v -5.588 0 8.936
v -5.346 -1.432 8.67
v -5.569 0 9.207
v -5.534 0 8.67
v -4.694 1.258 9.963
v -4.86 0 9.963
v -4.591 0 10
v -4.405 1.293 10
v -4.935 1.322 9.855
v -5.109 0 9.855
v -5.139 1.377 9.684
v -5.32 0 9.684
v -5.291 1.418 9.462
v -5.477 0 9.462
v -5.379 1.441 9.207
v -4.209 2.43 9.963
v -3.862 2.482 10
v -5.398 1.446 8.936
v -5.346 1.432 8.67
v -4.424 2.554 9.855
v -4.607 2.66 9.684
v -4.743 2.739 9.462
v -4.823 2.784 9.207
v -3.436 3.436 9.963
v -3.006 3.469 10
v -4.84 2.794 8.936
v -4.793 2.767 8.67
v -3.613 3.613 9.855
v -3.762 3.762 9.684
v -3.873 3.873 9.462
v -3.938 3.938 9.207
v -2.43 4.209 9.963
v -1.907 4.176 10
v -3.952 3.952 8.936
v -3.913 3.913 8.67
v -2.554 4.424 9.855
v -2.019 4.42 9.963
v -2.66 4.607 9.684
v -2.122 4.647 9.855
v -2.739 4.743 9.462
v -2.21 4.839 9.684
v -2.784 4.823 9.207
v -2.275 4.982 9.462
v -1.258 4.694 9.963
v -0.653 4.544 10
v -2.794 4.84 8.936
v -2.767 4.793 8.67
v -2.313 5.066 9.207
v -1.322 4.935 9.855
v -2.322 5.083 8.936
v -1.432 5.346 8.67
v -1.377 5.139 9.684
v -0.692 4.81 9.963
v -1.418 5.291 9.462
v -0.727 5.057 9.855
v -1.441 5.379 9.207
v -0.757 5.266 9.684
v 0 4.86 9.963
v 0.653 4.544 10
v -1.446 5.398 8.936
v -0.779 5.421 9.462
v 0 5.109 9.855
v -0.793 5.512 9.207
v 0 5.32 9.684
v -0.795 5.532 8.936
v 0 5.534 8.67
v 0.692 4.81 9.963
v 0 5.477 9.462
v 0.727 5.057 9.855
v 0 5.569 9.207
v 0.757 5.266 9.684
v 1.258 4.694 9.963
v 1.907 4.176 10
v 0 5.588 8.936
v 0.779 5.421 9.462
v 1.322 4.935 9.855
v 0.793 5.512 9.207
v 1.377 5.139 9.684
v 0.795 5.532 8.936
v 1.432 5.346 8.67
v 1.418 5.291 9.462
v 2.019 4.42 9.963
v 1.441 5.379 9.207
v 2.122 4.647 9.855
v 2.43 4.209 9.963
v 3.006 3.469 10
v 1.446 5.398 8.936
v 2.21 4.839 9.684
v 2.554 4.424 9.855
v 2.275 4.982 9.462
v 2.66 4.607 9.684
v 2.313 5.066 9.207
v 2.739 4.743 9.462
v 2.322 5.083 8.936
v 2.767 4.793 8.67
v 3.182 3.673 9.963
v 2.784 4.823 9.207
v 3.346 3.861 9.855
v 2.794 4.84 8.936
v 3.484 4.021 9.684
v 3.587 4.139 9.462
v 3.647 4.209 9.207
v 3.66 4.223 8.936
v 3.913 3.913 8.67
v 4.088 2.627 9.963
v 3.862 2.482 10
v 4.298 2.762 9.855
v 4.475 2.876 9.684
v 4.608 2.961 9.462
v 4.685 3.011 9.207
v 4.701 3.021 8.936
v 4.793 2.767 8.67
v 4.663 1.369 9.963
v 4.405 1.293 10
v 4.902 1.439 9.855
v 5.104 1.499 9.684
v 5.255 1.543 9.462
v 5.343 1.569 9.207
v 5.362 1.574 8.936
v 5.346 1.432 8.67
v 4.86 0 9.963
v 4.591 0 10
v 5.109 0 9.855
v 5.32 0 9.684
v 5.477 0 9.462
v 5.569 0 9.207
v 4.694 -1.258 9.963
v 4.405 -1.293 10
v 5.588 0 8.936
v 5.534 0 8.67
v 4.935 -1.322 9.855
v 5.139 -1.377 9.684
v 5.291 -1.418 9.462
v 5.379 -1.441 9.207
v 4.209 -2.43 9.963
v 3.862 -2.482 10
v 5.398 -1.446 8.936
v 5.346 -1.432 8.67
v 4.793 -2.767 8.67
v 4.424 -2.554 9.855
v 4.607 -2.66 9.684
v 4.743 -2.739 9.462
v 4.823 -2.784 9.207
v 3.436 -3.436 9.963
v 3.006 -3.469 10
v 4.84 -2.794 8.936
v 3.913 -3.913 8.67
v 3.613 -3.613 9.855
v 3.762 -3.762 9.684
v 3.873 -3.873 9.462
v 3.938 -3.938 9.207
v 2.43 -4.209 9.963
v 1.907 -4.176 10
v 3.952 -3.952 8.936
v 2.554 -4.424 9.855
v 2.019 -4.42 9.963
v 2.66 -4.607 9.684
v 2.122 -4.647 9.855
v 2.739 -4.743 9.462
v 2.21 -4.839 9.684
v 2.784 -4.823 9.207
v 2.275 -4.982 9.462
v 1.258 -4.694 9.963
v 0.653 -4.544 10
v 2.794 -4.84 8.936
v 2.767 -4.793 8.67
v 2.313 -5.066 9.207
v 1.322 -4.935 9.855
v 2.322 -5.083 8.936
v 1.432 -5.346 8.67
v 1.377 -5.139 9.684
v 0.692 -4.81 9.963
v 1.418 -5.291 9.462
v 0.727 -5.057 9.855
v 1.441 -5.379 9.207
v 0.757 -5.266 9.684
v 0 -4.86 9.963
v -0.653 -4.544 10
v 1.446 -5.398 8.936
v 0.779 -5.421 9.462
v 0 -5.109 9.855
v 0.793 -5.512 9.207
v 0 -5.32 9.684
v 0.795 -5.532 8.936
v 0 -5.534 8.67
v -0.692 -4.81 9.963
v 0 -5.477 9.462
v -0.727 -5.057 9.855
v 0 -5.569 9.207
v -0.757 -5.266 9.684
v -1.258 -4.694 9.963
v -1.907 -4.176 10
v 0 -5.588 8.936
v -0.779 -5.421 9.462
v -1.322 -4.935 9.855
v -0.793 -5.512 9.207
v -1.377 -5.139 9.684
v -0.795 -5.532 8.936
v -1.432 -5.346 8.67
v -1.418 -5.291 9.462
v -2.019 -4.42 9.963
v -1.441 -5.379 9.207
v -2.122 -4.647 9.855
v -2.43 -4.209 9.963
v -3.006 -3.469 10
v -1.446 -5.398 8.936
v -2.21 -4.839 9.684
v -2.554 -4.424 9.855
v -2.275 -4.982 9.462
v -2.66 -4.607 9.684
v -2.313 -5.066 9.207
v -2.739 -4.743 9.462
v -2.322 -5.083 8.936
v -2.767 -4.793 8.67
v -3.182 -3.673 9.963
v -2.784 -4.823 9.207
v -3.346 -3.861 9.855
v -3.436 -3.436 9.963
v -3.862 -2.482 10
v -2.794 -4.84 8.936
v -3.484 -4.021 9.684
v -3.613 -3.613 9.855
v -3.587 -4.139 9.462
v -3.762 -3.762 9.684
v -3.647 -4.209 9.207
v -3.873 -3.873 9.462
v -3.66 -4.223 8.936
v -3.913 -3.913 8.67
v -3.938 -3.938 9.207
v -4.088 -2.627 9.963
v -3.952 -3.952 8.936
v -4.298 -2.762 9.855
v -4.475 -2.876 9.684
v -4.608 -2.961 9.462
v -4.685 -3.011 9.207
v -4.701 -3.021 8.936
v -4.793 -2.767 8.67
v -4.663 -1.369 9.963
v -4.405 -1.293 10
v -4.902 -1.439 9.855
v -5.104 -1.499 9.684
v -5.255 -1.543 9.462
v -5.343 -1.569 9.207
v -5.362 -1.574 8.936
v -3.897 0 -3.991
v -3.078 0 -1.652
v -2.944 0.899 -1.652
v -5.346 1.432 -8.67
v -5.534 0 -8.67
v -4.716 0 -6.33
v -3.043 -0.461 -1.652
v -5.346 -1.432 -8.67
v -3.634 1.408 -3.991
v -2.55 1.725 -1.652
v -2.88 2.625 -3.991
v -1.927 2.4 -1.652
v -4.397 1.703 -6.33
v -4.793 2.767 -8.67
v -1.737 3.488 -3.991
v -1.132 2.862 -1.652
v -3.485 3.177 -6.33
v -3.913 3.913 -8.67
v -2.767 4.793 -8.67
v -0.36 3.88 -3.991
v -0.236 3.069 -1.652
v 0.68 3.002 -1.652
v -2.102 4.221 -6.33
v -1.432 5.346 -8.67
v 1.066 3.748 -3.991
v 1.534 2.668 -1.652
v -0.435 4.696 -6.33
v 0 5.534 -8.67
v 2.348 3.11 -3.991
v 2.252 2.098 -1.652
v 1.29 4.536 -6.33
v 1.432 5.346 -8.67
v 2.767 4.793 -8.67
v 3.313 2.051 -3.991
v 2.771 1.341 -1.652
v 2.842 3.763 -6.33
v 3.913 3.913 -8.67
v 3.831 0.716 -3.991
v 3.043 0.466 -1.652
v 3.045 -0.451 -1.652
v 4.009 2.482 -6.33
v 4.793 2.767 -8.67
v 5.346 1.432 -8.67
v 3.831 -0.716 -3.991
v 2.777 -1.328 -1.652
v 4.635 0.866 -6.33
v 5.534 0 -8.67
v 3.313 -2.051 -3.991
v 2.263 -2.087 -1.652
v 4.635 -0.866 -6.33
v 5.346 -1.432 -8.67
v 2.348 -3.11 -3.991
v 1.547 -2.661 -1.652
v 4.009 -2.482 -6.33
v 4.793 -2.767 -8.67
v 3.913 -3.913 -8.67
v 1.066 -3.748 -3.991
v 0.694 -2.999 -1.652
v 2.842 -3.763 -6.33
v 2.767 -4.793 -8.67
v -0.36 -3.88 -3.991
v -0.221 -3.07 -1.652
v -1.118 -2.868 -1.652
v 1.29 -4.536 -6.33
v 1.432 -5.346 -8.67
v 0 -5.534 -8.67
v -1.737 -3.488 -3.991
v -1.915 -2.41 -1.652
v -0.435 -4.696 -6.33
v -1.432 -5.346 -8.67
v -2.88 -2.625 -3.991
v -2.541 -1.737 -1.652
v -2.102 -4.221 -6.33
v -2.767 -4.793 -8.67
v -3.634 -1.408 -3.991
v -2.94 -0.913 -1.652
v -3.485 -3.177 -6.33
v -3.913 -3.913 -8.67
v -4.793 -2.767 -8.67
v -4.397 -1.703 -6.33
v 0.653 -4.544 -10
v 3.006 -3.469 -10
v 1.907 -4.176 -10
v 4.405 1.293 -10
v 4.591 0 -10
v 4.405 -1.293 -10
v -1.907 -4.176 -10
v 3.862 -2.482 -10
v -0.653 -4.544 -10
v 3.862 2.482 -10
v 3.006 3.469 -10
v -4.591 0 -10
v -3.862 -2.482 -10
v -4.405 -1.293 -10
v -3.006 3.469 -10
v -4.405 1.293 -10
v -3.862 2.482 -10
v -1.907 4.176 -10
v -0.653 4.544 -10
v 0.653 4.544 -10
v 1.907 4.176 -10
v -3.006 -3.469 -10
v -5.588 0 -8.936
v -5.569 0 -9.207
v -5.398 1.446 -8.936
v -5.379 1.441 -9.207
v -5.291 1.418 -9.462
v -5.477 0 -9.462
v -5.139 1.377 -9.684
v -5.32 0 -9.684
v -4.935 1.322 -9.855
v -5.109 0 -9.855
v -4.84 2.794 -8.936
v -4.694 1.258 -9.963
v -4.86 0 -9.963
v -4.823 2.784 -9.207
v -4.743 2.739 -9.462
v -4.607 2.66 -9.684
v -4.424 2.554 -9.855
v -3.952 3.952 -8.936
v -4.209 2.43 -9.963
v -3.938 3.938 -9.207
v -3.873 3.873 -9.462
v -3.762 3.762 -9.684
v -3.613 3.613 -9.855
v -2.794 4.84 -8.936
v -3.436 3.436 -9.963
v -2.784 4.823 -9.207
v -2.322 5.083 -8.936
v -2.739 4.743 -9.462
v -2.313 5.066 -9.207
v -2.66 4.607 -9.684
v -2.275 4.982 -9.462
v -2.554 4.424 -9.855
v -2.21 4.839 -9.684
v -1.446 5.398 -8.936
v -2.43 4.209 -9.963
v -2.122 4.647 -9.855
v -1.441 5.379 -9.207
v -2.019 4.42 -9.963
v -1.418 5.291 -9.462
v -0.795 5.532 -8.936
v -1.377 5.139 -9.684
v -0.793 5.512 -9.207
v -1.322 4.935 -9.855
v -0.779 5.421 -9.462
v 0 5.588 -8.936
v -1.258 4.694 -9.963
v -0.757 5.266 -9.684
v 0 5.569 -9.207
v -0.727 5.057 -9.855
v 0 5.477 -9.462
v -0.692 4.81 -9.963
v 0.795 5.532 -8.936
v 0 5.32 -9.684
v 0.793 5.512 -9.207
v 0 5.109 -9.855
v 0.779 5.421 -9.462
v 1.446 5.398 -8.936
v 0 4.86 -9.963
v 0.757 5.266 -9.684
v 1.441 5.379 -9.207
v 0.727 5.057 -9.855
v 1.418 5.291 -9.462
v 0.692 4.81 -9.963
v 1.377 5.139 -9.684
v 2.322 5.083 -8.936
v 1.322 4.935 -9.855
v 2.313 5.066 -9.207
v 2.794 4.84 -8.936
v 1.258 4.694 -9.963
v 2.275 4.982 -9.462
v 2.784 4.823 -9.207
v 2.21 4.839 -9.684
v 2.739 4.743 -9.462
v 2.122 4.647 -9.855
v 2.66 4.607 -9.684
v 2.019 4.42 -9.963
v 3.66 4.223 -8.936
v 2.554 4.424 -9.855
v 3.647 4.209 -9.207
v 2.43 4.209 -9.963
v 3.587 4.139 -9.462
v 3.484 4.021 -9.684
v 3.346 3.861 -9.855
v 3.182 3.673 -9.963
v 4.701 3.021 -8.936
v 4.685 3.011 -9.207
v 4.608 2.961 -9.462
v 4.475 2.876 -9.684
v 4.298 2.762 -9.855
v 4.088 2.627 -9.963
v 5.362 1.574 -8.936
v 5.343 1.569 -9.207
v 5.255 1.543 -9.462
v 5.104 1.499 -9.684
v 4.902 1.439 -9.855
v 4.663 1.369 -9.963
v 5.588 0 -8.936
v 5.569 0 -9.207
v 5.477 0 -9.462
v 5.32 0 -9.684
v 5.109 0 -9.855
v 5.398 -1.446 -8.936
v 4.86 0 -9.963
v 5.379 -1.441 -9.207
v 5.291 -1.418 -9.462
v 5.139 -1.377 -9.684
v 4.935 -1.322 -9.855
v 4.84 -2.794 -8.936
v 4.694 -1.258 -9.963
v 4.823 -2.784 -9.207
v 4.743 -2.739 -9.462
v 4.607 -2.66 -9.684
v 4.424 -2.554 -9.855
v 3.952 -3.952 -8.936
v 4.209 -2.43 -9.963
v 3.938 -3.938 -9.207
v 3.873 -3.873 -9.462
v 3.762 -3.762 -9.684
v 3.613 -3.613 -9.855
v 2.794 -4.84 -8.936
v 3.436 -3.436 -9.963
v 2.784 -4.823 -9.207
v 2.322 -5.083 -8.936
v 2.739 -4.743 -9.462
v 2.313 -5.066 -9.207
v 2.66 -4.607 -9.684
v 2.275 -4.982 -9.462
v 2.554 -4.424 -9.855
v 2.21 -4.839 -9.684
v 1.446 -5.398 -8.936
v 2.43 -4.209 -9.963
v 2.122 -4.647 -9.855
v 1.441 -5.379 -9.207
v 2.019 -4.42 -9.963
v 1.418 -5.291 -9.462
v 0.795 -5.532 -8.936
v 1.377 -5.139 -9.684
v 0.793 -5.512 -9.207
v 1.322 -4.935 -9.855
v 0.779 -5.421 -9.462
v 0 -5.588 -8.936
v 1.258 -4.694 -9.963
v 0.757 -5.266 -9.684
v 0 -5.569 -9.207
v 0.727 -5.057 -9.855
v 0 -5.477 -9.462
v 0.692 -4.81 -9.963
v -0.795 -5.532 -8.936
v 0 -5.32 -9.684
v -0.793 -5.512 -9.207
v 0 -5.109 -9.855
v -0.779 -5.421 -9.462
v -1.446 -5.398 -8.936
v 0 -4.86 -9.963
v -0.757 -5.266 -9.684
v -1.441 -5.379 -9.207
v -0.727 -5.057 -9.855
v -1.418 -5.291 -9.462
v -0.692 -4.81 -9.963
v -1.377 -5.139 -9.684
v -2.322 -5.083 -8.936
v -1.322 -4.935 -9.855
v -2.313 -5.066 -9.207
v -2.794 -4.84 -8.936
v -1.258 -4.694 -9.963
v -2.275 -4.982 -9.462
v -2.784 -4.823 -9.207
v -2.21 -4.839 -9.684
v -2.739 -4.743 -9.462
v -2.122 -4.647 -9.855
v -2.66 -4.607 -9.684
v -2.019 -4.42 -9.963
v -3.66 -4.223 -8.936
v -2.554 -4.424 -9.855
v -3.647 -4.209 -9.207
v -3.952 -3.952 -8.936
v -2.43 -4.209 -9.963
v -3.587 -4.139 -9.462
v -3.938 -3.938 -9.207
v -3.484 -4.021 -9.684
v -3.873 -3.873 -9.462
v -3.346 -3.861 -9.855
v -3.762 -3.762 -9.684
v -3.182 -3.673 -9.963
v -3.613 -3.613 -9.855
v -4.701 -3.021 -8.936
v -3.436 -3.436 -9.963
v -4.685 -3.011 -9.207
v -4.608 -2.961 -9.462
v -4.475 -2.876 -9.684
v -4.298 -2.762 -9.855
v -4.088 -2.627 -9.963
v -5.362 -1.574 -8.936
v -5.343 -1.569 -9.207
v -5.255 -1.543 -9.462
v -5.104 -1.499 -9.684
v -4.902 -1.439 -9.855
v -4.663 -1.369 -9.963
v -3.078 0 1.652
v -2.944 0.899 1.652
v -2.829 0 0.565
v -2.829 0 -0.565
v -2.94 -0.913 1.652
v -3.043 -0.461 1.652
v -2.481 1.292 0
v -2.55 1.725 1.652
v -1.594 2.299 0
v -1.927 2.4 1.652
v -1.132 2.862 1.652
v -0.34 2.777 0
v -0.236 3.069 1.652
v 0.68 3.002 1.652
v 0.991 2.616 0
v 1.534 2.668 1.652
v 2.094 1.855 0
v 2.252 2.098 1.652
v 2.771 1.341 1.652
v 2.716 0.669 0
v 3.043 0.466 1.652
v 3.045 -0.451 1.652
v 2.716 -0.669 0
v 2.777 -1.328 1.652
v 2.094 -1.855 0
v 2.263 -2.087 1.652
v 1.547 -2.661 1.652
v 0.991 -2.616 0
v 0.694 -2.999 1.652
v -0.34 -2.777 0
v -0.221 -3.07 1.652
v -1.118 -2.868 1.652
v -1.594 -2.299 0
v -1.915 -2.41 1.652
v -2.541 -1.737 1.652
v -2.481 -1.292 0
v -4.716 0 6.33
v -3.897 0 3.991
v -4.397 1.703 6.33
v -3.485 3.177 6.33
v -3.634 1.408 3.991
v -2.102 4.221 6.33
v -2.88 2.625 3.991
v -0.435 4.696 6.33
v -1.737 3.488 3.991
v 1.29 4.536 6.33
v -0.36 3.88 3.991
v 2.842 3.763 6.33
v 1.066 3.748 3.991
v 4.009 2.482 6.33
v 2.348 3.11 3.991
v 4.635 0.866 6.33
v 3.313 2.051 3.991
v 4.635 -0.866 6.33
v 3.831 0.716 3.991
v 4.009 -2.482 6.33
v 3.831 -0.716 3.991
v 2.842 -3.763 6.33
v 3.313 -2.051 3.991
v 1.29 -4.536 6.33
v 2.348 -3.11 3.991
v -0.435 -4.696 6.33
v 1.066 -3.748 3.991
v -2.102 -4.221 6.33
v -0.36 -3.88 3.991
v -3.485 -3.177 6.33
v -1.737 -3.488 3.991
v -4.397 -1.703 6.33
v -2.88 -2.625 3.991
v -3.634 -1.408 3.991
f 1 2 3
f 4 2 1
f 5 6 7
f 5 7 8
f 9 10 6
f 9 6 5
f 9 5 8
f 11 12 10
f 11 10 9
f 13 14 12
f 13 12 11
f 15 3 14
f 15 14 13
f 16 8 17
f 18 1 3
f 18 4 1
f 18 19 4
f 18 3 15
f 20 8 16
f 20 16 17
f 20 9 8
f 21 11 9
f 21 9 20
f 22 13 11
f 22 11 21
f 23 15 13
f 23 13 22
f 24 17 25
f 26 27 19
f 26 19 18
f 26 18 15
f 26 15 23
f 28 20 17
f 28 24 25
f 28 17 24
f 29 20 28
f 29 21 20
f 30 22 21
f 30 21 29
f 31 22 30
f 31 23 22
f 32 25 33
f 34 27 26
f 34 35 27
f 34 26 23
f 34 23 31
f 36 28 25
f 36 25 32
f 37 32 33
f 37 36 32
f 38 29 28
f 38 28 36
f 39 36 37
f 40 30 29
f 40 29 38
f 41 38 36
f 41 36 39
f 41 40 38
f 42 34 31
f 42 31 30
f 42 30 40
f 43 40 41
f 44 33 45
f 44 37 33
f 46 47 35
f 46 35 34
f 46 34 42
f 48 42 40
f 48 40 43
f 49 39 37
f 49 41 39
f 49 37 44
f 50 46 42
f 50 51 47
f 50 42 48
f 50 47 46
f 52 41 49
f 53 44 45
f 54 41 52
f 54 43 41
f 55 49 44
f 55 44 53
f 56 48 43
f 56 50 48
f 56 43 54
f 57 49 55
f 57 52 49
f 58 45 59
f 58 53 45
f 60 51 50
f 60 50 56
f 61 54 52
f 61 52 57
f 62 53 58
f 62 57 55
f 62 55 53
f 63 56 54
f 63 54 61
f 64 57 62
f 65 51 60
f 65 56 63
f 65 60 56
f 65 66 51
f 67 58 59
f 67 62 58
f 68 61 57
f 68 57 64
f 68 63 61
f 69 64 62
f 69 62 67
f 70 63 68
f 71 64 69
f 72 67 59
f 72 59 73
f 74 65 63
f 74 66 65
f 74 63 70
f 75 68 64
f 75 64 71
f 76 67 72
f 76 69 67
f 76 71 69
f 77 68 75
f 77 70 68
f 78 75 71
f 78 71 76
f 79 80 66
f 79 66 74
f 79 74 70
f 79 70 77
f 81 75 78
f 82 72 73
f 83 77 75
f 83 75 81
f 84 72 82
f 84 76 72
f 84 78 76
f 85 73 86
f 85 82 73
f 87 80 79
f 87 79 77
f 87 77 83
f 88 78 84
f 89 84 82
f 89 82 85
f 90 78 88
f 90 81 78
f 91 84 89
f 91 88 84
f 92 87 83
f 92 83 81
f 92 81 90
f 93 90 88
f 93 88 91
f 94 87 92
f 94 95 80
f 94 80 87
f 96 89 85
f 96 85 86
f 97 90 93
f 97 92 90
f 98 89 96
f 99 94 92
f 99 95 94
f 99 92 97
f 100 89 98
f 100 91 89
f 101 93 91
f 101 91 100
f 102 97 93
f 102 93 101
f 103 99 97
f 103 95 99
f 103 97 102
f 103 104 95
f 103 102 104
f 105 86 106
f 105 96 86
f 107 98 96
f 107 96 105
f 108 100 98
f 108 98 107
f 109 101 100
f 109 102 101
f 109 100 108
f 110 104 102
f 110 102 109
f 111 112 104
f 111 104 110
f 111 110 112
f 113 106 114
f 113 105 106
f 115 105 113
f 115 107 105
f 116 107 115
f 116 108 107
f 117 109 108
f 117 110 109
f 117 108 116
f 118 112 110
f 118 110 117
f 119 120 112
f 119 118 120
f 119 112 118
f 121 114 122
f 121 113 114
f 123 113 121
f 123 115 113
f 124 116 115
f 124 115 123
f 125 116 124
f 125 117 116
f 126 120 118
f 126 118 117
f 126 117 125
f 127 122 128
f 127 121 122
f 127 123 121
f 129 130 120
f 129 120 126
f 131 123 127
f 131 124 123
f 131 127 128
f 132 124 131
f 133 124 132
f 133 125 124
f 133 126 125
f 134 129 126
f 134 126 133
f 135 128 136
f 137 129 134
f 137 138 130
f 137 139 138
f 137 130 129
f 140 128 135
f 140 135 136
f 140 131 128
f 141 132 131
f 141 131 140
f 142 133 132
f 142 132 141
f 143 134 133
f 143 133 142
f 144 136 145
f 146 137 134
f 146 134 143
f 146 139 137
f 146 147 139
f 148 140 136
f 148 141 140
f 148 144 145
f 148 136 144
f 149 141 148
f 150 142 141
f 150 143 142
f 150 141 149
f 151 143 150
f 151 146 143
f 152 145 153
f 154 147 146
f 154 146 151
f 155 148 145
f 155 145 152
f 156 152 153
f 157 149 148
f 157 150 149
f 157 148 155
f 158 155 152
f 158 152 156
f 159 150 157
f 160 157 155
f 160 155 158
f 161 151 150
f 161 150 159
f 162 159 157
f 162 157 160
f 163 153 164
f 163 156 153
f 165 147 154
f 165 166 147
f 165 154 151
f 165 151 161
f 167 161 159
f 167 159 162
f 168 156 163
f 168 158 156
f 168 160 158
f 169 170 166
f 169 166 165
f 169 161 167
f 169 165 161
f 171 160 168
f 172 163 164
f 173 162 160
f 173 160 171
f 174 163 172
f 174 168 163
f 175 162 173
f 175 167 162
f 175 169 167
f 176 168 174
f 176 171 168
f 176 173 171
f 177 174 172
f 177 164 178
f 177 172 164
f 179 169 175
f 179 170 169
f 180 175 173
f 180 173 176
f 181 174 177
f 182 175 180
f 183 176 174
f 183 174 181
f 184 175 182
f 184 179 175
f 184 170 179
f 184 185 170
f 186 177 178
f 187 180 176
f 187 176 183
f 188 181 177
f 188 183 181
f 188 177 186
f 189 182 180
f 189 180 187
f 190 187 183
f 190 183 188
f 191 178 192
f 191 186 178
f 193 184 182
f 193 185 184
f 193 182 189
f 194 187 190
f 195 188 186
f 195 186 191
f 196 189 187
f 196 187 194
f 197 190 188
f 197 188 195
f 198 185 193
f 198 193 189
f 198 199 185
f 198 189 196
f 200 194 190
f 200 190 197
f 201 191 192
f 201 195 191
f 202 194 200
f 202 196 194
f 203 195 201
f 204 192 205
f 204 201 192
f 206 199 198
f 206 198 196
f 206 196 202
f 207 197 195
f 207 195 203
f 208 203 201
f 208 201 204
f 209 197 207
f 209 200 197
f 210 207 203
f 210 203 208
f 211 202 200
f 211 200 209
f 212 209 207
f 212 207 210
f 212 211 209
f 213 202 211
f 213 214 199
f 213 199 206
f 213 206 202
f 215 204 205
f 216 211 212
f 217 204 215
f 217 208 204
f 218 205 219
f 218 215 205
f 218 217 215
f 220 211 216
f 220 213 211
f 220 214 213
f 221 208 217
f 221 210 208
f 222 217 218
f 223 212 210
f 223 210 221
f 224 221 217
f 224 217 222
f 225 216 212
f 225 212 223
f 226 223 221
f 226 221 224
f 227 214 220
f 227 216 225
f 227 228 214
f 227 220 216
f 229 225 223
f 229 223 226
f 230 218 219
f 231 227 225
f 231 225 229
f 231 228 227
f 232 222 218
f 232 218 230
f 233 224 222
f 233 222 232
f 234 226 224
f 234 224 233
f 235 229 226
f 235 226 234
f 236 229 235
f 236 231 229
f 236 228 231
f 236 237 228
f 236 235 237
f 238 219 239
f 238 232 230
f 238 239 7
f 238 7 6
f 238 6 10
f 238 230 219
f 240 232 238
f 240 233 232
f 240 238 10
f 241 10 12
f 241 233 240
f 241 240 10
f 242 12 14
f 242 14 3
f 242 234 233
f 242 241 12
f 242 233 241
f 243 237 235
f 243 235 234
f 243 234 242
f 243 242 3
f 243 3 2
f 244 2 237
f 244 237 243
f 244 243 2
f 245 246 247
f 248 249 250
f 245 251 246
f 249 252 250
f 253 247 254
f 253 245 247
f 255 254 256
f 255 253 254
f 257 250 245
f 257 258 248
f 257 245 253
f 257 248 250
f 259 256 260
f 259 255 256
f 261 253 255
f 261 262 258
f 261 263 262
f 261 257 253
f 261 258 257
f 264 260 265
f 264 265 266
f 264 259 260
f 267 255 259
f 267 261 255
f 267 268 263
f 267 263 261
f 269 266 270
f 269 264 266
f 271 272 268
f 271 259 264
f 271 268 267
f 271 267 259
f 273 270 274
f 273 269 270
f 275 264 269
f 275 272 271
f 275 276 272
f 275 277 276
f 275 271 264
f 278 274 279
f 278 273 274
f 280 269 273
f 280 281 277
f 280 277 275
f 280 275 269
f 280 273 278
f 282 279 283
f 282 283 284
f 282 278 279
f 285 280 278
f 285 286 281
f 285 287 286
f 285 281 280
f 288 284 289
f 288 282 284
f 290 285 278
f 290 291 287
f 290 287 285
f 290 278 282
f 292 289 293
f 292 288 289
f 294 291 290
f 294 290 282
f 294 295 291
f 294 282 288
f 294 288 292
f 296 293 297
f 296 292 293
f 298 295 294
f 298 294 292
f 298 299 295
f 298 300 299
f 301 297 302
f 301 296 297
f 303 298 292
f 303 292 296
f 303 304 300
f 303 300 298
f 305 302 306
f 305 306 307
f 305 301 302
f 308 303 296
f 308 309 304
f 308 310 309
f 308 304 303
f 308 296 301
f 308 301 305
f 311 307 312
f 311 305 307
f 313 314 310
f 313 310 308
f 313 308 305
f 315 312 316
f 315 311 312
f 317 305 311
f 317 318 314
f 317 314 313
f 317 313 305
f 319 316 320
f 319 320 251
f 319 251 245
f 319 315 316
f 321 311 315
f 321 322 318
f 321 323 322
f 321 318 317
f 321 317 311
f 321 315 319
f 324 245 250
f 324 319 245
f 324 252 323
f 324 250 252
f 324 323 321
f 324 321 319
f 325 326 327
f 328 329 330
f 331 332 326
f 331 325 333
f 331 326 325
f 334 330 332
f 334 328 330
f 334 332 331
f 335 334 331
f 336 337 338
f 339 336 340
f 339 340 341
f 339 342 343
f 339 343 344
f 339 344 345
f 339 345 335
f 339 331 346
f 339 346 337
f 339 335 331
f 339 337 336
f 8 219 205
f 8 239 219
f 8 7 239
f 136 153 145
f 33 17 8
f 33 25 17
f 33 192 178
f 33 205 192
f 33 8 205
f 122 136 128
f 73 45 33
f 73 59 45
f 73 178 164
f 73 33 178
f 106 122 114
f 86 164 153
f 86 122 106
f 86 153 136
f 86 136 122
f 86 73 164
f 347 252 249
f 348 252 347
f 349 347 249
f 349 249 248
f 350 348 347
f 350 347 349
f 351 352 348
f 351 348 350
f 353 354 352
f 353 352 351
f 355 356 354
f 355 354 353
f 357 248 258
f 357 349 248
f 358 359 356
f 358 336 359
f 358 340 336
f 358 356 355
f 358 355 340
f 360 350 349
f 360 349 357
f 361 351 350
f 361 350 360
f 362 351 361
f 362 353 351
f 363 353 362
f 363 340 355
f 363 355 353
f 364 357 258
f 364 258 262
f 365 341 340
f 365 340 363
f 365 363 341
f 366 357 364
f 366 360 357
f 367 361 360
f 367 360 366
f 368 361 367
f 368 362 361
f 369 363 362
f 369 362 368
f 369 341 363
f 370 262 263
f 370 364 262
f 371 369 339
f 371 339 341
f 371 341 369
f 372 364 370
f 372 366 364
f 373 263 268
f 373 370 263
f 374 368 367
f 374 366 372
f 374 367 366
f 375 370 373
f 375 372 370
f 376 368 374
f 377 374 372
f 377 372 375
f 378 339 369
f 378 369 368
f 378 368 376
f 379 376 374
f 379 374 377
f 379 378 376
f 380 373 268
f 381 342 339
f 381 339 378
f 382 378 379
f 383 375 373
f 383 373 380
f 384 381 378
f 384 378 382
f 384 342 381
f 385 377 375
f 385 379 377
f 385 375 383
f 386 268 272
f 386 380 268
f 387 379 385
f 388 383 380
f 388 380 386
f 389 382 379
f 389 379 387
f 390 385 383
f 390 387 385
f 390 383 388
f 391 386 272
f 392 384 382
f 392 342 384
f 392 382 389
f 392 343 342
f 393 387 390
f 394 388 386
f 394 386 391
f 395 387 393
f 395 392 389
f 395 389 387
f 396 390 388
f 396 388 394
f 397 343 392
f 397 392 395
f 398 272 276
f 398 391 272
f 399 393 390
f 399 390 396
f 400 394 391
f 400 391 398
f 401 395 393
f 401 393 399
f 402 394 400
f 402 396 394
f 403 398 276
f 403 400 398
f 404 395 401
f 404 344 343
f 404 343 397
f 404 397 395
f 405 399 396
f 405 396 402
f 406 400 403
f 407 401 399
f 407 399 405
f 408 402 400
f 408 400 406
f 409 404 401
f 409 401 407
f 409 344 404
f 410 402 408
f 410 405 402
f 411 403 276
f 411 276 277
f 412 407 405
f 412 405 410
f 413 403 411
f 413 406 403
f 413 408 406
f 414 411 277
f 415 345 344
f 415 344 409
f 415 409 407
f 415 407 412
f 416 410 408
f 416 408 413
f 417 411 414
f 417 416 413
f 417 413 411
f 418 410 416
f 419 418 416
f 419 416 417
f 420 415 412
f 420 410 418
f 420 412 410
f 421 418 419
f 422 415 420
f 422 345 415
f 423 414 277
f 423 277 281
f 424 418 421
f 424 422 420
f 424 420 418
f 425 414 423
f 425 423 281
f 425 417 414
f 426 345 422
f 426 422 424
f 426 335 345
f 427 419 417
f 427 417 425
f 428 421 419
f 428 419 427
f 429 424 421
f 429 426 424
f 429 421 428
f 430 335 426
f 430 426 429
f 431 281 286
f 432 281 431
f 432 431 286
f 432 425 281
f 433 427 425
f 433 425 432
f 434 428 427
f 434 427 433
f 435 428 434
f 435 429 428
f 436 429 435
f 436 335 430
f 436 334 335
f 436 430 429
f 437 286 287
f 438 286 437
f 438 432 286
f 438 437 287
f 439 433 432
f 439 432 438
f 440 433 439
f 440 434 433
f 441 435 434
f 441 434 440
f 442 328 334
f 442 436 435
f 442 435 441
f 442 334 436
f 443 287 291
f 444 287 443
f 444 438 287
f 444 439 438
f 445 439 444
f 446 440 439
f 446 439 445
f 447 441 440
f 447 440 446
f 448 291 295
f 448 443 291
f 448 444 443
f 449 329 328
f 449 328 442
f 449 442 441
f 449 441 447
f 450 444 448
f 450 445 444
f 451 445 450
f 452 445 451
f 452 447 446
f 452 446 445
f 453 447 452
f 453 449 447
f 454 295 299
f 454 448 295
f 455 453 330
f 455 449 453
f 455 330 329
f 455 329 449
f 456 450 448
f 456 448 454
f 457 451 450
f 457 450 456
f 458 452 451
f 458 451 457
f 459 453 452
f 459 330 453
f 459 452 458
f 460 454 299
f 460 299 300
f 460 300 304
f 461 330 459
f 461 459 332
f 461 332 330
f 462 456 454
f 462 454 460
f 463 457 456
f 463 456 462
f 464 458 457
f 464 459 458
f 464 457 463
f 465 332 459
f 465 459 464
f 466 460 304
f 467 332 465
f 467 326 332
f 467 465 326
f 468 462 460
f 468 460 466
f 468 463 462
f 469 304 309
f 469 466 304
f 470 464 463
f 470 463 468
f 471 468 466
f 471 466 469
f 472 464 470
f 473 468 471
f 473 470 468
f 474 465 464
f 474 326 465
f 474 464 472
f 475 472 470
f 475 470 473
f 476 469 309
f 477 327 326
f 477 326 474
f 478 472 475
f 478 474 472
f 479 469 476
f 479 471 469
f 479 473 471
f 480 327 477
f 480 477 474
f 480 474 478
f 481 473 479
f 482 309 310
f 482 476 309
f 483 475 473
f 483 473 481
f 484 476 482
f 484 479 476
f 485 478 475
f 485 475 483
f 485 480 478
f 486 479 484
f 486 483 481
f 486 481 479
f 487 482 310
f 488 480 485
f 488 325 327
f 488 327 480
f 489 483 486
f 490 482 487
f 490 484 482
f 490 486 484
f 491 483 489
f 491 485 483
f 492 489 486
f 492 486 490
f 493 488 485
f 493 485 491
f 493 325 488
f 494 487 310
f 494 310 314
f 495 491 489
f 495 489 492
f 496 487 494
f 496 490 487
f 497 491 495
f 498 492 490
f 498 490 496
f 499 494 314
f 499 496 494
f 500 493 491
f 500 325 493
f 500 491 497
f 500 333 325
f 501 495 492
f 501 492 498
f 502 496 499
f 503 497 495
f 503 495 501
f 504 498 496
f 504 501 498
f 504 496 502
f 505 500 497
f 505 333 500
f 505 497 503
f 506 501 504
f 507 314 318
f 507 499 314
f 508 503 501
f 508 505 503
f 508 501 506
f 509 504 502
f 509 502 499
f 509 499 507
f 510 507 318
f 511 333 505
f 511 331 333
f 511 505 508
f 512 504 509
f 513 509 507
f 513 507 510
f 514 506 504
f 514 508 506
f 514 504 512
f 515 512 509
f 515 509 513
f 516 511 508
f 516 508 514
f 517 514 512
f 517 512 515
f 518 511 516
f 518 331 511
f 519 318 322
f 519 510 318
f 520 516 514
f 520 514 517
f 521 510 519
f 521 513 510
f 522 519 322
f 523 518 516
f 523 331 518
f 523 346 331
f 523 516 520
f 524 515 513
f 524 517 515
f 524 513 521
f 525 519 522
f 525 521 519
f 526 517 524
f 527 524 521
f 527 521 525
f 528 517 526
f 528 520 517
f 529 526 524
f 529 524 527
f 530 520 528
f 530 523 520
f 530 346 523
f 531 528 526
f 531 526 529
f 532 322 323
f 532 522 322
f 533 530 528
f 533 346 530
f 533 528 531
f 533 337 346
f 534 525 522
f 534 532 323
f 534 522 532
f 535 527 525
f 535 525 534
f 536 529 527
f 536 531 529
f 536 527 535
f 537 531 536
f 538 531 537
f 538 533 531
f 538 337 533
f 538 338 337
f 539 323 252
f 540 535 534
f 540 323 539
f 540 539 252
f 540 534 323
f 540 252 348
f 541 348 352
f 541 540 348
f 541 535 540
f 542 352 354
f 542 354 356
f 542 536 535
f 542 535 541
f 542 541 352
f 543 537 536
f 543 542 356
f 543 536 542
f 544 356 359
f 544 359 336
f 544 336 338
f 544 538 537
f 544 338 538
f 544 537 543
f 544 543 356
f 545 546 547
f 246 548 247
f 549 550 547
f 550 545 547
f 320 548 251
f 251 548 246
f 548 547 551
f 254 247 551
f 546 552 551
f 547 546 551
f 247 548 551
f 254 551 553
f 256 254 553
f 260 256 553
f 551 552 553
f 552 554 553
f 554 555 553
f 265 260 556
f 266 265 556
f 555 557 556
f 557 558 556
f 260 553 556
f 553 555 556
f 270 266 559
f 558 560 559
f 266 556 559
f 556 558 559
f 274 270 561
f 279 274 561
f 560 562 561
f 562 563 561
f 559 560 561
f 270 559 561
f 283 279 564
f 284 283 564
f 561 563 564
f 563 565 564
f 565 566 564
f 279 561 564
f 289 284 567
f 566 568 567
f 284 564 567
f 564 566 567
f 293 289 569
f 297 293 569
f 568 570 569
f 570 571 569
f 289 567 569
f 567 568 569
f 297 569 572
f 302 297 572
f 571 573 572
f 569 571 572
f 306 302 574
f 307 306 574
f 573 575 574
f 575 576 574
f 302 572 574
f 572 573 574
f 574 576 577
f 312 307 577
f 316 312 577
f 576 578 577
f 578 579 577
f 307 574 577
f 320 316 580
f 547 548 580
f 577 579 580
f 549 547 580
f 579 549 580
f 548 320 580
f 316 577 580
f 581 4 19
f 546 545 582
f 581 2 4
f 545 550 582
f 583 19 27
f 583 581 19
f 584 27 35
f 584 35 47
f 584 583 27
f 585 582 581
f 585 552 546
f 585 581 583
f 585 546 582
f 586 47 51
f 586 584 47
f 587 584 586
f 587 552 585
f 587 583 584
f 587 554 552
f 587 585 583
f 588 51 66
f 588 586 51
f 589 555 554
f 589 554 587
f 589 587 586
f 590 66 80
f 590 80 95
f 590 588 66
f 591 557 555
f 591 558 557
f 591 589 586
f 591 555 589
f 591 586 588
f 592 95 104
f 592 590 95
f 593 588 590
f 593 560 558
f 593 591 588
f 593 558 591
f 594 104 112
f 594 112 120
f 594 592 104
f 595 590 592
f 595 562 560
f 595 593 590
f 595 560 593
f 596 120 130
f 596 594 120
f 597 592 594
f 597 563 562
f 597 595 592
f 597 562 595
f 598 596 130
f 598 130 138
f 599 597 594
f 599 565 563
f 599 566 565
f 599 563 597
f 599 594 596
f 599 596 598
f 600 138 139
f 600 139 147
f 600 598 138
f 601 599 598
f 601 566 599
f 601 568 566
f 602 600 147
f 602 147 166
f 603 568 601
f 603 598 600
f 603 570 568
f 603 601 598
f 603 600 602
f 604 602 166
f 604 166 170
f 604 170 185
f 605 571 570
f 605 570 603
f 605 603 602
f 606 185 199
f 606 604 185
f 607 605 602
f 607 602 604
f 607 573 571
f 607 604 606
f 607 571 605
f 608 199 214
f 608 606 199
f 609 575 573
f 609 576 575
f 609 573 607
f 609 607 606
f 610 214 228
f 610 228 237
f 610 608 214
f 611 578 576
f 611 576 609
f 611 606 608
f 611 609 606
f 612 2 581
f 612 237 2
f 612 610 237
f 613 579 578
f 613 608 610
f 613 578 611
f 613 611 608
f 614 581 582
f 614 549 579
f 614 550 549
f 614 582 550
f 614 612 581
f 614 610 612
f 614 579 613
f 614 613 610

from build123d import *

# Parameters (mm, degrees)
F2_R = 1
F3_R = 5


with BuildPart() as f1:
    # F0 (on Front) → F1 (revolve)
    with BuildSketch(Plane.XZ):
        Polygon((0, -10), (0, 10), (-6, 10), (-2.5, 0), (-6, -10), align=None)
    revolve(axis=Axis((0, 0, 0), (0, 0, -1)))

    # F2
    f2_edges = [f1.edges().sort_by_distance(p)[0] for p in [
        (6, 0, 10),
        (6, 0, -10),
    ]]
    fillet(f2_edges, radius=F2_R)

    # F3
    f3_edges = [f1.edges().sort_by_distance(p)[0] for p in [
        (2.5, 0, 0),
    ]]
    fillet(f3_edges, radius=F3_R)


solid = f1.part
